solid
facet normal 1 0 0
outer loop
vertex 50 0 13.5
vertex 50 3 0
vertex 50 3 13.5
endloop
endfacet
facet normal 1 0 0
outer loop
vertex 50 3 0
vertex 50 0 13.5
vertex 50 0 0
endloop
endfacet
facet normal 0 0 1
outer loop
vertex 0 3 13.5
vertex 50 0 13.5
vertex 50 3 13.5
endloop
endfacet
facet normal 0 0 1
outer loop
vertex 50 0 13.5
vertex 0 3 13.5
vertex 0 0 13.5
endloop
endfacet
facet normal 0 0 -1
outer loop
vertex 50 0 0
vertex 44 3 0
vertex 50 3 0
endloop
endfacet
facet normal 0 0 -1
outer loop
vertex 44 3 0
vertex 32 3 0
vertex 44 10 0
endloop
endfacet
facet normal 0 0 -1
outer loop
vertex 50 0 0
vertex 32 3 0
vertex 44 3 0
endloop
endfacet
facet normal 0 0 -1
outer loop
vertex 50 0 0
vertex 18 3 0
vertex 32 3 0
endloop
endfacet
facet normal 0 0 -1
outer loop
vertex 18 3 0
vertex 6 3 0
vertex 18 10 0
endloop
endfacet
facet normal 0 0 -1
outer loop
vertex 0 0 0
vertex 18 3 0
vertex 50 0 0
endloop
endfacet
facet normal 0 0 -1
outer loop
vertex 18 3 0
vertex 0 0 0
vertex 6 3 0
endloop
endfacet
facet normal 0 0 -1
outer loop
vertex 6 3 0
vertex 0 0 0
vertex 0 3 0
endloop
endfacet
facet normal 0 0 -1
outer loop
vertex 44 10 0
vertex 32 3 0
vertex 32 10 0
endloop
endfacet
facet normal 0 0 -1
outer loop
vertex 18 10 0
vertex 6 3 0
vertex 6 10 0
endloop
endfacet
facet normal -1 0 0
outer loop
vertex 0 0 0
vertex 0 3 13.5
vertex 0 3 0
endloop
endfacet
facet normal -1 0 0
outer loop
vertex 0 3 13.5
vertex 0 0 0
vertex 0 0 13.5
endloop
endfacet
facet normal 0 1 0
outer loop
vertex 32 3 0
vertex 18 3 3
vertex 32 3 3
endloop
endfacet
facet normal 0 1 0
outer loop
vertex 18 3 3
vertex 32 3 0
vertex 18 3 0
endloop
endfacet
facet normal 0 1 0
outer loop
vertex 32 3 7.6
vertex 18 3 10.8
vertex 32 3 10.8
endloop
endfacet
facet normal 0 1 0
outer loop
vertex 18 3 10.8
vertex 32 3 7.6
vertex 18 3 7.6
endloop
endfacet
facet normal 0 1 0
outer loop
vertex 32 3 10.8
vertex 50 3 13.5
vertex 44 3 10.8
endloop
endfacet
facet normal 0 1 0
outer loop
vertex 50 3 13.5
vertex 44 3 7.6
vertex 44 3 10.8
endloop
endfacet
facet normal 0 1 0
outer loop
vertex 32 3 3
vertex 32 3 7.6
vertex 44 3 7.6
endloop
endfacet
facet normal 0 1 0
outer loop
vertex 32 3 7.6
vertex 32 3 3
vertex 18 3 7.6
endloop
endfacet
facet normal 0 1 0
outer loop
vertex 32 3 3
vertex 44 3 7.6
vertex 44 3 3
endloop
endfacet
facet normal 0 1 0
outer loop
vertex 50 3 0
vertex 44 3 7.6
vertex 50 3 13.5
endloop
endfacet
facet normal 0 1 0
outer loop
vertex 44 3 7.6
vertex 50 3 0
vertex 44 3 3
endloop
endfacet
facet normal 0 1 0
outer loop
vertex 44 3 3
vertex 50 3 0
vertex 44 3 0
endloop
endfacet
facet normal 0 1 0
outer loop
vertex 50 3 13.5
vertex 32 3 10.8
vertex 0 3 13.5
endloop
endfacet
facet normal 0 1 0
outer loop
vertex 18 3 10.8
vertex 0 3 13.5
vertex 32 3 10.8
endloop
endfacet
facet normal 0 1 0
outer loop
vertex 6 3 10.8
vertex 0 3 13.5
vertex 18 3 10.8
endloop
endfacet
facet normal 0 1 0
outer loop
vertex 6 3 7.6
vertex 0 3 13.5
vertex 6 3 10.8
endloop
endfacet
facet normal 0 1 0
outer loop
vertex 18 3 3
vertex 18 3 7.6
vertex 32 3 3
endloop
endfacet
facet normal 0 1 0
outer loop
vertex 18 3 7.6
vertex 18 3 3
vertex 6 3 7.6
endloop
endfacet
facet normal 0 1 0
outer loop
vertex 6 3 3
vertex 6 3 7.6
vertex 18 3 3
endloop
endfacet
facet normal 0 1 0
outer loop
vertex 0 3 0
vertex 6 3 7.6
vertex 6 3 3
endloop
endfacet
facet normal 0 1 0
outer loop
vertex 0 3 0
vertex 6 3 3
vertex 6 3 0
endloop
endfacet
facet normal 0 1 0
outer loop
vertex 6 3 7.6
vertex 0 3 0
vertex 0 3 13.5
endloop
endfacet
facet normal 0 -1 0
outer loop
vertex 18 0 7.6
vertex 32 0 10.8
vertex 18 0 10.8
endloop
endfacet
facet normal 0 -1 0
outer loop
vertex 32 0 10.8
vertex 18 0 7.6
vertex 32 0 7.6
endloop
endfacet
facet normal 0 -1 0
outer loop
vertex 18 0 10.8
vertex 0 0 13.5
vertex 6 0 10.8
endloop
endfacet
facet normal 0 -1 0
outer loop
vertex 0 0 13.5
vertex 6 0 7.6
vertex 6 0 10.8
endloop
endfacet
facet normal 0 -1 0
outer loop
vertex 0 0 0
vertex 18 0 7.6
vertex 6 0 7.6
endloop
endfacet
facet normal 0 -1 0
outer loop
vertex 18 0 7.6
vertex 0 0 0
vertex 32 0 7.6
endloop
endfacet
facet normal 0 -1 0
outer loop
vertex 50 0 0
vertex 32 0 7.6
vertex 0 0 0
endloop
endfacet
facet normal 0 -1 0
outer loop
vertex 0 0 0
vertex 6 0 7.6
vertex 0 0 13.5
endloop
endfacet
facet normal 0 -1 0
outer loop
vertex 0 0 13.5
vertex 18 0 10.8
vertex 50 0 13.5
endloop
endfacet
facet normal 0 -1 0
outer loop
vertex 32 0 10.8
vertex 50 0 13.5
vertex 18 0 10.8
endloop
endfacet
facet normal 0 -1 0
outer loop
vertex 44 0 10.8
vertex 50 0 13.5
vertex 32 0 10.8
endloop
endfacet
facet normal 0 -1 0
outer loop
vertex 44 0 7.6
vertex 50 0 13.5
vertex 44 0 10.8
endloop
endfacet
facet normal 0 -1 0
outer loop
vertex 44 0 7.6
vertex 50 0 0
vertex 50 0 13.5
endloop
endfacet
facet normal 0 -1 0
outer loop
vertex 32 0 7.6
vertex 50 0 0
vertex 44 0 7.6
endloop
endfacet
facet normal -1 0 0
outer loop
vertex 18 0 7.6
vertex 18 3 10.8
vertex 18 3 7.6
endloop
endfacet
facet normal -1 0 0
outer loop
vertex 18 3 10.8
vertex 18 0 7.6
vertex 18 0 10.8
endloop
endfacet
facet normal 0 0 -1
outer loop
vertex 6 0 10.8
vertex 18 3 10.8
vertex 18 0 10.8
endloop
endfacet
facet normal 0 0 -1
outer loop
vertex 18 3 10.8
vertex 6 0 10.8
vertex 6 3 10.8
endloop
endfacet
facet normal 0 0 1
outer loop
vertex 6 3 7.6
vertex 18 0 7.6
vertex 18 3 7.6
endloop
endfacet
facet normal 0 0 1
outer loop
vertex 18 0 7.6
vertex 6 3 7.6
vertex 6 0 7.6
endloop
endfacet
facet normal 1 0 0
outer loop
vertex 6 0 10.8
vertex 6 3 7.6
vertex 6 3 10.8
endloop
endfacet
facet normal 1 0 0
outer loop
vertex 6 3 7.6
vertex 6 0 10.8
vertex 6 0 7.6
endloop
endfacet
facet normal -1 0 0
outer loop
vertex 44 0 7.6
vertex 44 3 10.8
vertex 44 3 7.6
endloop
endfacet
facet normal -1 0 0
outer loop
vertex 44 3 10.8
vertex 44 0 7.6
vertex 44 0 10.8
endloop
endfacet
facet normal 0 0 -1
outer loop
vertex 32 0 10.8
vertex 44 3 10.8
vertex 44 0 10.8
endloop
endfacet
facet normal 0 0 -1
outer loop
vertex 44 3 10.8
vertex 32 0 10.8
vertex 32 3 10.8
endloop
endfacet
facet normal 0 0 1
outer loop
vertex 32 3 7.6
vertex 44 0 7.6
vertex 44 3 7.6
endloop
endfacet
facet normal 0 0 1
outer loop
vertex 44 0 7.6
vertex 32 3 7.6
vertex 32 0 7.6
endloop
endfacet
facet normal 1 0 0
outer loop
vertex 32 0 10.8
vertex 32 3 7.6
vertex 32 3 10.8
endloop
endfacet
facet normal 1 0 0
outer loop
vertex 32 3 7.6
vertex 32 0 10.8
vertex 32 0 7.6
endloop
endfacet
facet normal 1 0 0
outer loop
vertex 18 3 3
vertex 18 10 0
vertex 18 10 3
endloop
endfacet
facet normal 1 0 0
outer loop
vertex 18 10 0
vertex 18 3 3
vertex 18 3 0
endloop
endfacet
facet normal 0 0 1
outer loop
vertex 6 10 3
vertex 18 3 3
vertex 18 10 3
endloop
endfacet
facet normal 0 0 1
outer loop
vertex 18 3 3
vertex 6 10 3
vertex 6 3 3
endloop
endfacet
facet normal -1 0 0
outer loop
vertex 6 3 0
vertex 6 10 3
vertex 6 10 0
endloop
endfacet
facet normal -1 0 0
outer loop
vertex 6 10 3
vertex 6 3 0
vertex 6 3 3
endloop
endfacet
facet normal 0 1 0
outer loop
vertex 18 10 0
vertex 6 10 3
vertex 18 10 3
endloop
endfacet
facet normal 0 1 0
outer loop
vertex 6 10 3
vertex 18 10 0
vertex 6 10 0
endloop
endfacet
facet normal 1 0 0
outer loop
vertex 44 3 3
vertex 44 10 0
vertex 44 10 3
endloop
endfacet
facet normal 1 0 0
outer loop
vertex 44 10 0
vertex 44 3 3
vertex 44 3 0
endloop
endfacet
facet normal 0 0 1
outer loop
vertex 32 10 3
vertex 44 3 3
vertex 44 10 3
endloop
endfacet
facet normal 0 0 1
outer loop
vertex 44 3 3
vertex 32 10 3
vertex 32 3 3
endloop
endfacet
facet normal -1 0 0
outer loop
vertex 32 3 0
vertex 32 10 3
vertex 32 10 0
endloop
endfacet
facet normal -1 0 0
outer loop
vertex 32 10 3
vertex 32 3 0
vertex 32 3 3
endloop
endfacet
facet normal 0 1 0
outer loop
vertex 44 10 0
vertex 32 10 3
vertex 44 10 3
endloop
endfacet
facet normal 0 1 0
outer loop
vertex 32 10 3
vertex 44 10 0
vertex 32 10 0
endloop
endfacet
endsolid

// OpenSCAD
difference()
{
cube([50,3,13.5]);

translate([6,0,7.6])
cube([12,3,3.2]);

translate([32,0,7.6])
cube([12,3,3.2]);
}

translate([6,0,0])
cube([12,10,3]);

translate([32,0,0])
cube([12,10,3]);
